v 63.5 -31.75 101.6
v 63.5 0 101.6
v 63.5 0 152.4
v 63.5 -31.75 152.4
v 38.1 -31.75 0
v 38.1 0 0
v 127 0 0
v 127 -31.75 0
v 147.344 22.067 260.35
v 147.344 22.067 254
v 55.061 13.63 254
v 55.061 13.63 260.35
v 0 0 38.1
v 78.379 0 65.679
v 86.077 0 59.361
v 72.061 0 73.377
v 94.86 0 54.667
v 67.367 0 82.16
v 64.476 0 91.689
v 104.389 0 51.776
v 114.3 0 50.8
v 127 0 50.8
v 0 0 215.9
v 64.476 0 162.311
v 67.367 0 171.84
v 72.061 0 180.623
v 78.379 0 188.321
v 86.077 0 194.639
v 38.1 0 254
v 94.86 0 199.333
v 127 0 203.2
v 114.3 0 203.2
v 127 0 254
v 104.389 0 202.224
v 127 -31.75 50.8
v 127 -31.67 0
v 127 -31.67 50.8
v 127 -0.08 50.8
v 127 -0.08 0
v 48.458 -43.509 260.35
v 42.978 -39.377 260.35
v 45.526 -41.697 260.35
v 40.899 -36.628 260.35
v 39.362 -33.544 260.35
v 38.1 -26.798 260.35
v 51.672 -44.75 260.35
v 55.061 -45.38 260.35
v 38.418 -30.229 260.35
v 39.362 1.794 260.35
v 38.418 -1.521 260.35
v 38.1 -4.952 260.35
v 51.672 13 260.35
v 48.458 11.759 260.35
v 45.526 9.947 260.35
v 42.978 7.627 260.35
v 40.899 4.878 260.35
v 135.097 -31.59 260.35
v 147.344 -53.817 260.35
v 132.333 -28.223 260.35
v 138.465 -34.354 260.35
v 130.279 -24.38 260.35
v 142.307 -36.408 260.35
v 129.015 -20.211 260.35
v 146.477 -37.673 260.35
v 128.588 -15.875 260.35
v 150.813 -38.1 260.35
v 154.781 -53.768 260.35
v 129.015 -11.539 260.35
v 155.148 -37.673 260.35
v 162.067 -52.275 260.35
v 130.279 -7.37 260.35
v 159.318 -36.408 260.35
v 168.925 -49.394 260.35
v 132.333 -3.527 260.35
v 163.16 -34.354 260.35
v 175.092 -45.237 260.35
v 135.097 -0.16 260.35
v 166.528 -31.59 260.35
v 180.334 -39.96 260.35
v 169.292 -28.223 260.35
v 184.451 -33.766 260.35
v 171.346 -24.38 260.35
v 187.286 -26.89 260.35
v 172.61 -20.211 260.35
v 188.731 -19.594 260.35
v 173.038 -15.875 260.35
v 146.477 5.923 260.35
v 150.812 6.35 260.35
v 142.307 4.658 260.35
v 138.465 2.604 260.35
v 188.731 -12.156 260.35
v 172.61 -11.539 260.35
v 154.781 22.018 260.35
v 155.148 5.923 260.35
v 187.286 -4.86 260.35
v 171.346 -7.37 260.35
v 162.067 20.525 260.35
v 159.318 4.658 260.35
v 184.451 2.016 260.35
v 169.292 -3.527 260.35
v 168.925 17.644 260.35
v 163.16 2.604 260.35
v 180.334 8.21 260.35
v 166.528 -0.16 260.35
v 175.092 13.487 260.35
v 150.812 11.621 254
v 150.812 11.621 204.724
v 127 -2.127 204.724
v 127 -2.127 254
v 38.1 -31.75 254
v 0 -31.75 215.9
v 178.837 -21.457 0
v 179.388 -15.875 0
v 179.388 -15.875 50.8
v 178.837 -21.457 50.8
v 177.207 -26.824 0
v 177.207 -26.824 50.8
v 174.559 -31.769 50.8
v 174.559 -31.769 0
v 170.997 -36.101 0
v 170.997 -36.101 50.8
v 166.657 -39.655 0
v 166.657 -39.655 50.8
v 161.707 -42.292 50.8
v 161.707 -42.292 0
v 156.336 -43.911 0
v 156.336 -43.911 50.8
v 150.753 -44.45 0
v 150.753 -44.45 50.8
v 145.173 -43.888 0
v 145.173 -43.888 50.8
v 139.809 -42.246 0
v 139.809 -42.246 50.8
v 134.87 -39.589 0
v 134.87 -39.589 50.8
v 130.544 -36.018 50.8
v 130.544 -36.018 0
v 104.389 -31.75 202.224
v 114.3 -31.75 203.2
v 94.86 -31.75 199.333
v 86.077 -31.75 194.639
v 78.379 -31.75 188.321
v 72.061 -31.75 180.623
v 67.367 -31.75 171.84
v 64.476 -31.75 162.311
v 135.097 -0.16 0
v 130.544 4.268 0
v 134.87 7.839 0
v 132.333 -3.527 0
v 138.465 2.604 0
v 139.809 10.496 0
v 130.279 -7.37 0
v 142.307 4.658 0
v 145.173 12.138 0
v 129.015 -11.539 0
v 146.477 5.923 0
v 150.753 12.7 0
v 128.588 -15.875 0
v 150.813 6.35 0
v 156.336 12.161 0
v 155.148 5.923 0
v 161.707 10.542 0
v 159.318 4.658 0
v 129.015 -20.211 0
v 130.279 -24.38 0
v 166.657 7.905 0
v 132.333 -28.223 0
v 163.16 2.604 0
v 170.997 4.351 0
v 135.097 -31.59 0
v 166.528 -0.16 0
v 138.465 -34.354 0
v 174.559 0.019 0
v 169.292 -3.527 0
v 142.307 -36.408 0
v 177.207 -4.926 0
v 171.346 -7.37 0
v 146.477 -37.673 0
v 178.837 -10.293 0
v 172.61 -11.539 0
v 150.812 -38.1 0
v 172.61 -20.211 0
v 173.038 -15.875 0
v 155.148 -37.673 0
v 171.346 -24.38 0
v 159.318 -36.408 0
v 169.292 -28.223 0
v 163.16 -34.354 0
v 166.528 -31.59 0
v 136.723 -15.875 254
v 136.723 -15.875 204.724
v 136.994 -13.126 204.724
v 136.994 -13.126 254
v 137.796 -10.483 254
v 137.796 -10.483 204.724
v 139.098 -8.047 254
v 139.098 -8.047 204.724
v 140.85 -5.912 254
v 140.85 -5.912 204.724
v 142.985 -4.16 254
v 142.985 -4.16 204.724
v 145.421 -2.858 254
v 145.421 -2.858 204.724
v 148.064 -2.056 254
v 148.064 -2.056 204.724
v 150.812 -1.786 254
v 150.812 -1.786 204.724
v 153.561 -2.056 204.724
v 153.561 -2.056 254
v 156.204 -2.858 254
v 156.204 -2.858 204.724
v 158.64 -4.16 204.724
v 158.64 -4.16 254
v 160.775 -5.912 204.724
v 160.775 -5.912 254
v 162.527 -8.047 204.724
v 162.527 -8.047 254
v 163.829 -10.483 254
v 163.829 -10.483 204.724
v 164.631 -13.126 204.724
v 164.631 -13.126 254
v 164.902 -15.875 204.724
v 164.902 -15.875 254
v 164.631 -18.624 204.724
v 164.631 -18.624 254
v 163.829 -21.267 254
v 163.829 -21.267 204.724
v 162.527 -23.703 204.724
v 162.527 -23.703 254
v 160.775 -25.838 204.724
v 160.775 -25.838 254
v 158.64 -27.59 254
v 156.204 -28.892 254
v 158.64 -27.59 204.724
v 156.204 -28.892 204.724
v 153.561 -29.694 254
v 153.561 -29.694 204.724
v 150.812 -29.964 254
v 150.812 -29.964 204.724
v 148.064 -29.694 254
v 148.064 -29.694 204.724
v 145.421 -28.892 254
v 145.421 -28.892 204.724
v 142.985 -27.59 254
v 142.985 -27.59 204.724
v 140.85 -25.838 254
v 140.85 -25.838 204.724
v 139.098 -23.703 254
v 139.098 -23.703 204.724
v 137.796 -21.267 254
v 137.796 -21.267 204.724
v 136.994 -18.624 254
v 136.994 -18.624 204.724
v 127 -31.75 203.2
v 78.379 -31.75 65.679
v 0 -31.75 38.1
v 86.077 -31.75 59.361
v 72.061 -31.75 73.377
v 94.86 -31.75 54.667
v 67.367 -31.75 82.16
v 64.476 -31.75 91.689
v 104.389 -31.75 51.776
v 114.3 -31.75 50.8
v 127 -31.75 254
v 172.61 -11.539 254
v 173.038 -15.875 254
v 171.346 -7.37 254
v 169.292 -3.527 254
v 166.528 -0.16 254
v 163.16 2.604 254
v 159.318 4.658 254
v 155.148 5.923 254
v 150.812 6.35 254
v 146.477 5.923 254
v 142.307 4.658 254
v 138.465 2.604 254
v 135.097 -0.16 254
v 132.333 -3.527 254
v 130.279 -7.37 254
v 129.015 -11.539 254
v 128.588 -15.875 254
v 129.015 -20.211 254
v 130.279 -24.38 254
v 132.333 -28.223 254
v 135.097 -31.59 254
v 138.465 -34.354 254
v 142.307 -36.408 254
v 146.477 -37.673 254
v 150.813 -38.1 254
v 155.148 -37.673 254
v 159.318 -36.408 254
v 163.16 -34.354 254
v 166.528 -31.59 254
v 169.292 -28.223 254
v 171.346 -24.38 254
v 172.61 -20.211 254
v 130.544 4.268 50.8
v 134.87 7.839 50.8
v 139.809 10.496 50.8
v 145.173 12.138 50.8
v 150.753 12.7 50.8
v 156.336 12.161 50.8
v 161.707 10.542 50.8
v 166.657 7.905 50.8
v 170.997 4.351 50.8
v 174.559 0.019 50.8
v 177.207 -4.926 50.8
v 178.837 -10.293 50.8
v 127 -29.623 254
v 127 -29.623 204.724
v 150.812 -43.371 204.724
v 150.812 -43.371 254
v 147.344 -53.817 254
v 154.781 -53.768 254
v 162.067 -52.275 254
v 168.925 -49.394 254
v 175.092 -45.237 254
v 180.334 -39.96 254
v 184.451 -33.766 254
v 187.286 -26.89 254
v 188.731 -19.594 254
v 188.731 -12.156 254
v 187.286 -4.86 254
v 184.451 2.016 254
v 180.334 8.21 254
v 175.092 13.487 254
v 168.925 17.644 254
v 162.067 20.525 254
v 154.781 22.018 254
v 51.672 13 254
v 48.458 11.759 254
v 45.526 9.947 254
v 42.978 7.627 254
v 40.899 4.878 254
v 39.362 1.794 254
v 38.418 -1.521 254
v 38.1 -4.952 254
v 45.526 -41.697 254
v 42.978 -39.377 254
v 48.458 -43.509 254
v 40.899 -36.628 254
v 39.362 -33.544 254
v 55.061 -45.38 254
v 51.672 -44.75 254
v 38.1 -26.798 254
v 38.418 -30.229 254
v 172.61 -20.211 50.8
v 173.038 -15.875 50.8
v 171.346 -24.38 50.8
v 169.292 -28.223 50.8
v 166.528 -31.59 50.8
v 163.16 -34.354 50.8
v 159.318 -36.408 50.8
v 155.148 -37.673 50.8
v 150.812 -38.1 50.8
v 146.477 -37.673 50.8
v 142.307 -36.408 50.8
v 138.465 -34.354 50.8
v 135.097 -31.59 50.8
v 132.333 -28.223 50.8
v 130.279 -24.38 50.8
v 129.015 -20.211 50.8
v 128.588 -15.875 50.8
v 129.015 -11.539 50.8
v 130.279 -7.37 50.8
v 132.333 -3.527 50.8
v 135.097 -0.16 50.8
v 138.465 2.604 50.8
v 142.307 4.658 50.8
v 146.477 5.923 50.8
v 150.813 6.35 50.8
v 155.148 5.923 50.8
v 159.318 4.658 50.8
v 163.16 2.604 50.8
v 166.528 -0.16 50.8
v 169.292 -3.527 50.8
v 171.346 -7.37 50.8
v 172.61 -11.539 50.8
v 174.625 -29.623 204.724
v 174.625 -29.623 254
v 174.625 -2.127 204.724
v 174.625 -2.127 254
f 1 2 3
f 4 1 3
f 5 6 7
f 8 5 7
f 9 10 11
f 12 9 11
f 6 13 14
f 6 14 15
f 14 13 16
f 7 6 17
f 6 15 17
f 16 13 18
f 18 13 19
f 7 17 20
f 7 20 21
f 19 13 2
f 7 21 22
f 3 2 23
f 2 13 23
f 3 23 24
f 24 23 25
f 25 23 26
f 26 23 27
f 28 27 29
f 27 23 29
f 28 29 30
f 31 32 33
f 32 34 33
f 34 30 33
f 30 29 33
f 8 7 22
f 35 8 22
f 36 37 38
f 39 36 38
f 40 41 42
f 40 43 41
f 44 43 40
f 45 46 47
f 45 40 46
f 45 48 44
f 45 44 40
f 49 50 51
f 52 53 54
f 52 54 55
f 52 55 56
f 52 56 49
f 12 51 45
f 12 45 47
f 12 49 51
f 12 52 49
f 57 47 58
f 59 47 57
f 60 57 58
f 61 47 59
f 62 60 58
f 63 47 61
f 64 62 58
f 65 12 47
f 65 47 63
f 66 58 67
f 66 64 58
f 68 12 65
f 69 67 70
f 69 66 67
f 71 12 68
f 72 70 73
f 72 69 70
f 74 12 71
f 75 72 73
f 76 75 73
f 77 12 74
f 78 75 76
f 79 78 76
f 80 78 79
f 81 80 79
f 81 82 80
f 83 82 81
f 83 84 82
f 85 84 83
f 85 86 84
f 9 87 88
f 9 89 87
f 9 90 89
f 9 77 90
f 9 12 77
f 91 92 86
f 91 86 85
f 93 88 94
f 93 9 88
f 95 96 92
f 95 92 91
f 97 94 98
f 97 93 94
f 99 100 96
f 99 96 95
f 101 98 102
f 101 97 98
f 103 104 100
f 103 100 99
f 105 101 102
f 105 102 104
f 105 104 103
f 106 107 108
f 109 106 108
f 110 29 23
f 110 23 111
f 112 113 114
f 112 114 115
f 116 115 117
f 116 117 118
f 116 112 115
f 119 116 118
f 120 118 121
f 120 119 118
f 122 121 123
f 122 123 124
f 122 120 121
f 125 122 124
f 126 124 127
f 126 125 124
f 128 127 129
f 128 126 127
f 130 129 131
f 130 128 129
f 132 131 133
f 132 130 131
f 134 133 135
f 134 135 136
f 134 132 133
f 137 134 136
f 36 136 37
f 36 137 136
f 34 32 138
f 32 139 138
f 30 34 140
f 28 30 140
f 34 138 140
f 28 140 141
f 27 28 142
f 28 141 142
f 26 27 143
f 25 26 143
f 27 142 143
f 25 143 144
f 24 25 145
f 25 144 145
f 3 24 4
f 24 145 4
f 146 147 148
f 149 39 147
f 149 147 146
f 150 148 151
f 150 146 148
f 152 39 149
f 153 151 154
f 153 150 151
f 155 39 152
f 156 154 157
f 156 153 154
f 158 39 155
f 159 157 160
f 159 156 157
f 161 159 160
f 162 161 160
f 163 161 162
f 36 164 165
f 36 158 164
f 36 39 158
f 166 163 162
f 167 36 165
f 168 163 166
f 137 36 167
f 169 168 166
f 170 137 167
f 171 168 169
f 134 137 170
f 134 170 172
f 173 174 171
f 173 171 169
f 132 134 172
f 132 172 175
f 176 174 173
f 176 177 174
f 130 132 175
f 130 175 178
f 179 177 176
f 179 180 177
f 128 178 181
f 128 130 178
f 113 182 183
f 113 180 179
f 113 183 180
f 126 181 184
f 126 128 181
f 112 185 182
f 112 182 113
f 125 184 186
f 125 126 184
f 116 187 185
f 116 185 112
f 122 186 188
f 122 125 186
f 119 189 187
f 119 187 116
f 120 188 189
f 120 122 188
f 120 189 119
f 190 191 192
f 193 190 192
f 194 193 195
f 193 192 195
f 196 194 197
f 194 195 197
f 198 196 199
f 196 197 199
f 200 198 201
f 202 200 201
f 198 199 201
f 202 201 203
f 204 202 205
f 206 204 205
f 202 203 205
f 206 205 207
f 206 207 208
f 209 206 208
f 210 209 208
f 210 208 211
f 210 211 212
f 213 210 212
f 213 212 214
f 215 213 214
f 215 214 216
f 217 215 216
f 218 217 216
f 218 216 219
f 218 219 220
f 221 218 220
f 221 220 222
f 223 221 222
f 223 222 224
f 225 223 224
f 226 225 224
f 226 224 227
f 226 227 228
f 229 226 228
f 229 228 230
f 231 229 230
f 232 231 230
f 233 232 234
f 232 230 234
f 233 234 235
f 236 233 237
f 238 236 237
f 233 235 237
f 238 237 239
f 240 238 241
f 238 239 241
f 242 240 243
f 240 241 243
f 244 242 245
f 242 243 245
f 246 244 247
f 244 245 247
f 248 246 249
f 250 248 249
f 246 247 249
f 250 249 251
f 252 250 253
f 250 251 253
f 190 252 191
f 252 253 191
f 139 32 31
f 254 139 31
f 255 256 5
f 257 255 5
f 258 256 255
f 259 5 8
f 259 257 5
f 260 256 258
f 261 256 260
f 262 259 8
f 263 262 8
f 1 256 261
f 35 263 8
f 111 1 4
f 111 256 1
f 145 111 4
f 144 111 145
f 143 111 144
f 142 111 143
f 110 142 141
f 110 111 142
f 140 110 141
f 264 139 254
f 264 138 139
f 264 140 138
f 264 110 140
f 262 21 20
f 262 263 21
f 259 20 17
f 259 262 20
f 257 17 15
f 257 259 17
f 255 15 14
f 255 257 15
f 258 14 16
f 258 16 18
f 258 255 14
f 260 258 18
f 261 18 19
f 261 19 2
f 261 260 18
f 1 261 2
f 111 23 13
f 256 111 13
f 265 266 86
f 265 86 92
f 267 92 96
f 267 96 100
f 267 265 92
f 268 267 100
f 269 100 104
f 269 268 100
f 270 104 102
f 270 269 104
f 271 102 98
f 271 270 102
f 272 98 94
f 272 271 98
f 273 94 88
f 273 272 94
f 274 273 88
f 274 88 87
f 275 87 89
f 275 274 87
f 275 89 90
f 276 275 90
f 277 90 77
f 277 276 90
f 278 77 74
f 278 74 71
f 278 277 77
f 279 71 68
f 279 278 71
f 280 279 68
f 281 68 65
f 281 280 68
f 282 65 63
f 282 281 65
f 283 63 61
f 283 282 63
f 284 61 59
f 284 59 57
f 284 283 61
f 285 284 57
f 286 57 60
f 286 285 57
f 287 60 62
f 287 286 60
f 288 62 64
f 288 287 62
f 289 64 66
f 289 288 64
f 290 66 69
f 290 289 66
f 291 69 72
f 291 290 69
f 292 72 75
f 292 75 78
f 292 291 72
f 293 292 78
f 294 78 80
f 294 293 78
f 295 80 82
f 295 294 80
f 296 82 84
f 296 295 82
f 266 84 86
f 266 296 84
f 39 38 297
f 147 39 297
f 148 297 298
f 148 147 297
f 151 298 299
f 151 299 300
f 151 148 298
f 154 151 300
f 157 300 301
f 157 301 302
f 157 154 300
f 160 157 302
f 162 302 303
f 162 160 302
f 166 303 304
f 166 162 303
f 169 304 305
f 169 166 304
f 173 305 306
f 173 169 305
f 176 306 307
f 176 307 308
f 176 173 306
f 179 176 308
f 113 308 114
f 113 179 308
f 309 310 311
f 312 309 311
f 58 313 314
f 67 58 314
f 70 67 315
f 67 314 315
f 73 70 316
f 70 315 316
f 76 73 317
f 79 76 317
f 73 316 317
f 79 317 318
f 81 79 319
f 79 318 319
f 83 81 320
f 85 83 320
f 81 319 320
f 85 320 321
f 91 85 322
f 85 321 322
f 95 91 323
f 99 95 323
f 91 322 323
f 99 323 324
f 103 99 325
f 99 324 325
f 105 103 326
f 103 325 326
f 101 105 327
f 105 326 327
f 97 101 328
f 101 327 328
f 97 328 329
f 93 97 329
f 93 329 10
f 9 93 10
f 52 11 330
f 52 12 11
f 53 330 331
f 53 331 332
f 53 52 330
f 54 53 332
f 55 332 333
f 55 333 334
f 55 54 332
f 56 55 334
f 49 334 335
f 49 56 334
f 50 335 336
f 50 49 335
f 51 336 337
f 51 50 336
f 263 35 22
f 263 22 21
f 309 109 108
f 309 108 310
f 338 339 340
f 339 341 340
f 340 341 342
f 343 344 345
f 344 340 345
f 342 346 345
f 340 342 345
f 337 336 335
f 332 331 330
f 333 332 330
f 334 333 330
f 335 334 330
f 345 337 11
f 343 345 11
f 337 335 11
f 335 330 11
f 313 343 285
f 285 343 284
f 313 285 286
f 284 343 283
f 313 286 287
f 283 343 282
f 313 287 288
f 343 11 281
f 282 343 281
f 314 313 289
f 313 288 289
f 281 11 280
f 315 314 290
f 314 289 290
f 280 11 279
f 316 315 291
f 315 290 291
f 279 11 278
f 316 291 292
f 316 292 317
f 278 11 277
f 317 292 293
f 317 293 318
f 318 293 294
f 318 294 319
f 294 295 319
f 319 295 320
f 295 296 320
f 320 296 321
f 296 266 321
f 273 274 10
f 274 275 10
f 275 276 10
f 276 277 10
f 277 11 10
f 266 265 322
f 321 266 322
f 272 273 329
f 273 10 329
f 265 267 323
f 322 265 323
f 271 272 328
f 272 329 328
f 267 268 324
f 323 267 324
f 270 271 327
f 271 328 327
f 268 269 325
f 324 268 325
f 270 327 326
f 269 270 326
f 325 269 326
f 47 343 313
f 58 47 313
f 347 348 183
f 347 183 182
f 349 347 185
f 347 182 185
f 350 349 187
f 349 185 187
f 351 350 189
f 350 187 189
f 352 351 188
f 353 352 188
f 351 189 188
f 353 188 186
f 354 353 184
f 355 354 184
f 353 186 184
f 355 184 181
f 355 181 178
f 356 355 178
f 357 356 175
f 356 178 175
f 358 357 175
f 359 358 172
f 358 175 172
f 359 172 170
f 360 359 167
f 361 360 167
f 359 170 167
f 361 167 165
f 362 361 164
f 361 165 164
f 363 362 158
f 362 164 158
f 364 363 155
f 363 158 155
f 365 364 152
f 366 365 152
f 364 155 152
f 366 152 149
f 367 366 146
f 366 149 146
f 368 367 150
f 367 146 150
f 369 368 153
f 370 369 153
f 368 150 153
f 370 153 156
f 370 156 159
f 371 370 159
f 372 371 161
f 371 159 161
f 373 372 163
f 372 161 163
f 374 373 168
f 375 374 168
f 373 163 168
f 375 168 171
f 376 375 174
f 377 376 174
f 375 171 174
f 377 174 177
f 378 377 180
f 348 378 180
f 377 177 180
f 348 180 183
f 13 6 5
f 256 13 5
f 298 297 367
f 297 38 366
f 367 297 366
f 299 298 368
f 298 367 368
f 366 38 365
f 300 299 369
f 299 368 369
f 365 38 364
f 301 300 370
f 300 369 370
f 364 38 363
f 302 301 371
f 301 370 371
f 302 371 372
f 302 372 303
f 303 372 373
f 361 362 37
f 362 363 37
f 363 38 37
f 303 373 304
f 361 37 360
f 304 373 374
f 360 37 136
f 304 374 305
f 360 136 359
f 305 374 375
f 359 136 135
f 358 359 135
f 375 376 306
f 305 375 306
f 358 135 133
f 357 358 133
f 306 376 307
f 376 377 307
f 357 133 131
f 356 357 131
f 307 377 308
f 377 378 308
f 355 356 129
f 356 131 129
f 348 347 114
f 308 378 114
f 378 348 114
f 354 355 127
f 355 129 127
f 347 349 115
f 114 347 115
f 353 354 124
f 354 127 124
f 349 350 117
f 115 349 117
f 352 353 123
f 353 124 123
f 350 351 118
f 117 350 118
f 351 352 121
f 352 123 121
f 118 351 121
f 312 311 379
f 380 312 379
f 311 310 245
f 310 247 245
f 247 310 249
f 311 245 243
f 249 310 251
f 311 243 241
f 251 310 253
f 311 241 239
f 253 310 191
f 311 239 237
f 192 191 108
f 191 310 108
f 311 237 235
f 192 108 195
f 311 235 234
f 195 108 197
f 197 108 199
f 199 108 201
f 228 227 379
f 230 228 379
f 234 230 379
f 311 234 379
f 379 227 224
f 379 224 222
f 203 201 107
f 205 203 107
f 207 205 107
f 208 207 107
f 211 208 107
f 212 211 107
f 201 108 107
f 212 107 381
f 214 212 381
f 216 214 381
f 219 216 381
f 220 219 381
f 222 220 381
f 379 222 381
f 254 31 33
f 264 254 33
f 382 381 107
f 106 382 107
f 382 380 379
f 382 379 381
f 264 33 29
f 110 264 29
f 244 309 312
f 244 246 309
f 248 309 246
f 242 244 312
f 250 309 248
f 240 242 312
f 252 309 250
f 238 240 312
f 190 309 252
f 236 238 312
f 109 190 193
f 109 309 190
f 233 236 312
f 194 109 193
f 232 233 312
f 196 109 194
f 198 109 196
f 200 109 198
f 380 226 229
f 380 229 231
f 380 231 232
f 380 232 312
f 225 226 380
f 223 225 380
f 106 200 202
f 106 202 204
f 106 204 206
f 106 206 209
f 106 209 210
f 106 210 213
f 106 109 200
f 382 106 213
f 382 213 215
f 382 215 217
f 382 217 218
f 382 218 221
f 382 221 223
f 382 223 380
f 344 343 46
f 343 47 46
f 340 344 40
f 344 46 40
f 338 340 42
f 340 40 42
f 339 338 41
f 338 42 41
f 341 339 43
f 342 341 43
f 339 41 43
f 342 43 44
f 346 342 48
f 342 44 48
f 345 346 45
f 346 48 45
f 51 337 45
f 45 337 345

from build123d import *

# Parameters (mm, degrees)
F1_DEPTH  = 31.75
F2_SIZE   = 38.1
F3_R      = 50.8
F5_DEPTH  = 49.276
F7_D      = 28.17876
F8_R      = 22.225
F9_DEPTH  = 50.8
F10_R     = 22.225
F11_DEPTH = 6.35
F12_R     = 18.6594688317


with BuildPart() as f1:
    # F0 (on Front) → F1 (new body)
    with BuildSketch(Plane.XZ):
        Polygon((0, 254), (0, 0), (127, 0), (127, 50.8), (63.5, 50.8), (63.5, 203.2), (127, 203.2), (127, 254), align=None)
    extrude(amount=F1_DEPTH)

    # F2
    f2_edges = [f1.edges().sort_by_distance(p)[0] for p in [
        (0, -15.875, 254),
        (0, -15.875, 0),
    ]]
    chamfer(f2_edges, length=F2_SIZE)

    # F3
    f3_edges = [f1.edges().sort_by_distance(p)[0] for p in [
        (63.5, -15.875, 203.2),
        (63.5, -15.875, 50.8),
    ]]
    fillet(f3_edges, radius=F3_R)


with BuildPart() as f5:
    # F4 (on face) → F5 (new body)
    with BuildSketch(Plane.XY.offset(254)):
        Polygon((127, -29.6231532851), (150.8125, -43.3713065702), (174.625, -29.6231532851), (174.625, -2.1268467149), (150.8125, 11.6213065702), (127, -2.1268467149), align=None)
    extrude(amount=-F5_DEPTH)

    # F7 (through all)
    with Locations(Plane.XY.offset(254)):
        with Locations((150.8125, -15.875)):
            Hole(F7_D / 2)


with BuildPart() as f9:
    # F8 (on face) → F9 (new body)
    with BuildSketch(Plane(origin=(0, 0, 0), x_dir=(1, 0, 0), z_dir=(0, 0, -1))):
        with BuildLine():
            ThreePointArc((127, 0.0795744359), (159.061391971, -11.4834796041), (179.3875, 15.875))
            ThreePointArc((179.3875, 15.875), (159.061391971, 43.2334796041), (127, 31.6704255641))
            Line((127, 31.6704255641), (127, 0.0795744359))
        make_face()
        with Locations((150.8125, 15.875)):
            Circle(F8_R, mode=Mode.SUBTRACT)
    extrude(amount=-F9_DEPTH)


with BuildPart() as f11:
    # F10 (on face) → F11 (new body)
    with BuildSketch(Plane.XY.offset(254)):
        with BuildLine():
            Line((38.1, -43.8292118832), (147.3436929141, -53.8167629717))
            ThreePointArc((147.3436929141, -53.8167629717), (188.9125, -15.875), (147.3436929141, 22.0667629717))
            Line((147.3436929141, 22.0667629717), (38.1, 12.0792118832))
            Line((38.1, 12.0792118832), (38.1, 0))
            Line((38.1, 0), (127, 0))
            Line((127, 0), (127, -31.75))
            Line((127, -31.75), (38.1, -31.75))
            Line((38.1, -31.75), (38.1, -43.8292118832))
        make_face()
        with Locations((150.8125, -15.875)):
            Circle(F10_R, mode=Mode.SUBTRACT)
        Polygon((38.1, -15.875), (38.1, -31.75), (127, -31.75), (127, 0), (38.1, 0), align=None)
    extrude(amount=F11_DEPTH)

    # F12
    f12_edges = [f11.edges().sort_by_distance(p)[0] for p in [
        (38.1, -43.829212, 257.175),
        (38.1, 12.079212, 257.175),
    ]]
    fillet(f12_edges, radius=F12_R)


solid = Compound([f1.part, f5.part, f9.part, f11.part])
